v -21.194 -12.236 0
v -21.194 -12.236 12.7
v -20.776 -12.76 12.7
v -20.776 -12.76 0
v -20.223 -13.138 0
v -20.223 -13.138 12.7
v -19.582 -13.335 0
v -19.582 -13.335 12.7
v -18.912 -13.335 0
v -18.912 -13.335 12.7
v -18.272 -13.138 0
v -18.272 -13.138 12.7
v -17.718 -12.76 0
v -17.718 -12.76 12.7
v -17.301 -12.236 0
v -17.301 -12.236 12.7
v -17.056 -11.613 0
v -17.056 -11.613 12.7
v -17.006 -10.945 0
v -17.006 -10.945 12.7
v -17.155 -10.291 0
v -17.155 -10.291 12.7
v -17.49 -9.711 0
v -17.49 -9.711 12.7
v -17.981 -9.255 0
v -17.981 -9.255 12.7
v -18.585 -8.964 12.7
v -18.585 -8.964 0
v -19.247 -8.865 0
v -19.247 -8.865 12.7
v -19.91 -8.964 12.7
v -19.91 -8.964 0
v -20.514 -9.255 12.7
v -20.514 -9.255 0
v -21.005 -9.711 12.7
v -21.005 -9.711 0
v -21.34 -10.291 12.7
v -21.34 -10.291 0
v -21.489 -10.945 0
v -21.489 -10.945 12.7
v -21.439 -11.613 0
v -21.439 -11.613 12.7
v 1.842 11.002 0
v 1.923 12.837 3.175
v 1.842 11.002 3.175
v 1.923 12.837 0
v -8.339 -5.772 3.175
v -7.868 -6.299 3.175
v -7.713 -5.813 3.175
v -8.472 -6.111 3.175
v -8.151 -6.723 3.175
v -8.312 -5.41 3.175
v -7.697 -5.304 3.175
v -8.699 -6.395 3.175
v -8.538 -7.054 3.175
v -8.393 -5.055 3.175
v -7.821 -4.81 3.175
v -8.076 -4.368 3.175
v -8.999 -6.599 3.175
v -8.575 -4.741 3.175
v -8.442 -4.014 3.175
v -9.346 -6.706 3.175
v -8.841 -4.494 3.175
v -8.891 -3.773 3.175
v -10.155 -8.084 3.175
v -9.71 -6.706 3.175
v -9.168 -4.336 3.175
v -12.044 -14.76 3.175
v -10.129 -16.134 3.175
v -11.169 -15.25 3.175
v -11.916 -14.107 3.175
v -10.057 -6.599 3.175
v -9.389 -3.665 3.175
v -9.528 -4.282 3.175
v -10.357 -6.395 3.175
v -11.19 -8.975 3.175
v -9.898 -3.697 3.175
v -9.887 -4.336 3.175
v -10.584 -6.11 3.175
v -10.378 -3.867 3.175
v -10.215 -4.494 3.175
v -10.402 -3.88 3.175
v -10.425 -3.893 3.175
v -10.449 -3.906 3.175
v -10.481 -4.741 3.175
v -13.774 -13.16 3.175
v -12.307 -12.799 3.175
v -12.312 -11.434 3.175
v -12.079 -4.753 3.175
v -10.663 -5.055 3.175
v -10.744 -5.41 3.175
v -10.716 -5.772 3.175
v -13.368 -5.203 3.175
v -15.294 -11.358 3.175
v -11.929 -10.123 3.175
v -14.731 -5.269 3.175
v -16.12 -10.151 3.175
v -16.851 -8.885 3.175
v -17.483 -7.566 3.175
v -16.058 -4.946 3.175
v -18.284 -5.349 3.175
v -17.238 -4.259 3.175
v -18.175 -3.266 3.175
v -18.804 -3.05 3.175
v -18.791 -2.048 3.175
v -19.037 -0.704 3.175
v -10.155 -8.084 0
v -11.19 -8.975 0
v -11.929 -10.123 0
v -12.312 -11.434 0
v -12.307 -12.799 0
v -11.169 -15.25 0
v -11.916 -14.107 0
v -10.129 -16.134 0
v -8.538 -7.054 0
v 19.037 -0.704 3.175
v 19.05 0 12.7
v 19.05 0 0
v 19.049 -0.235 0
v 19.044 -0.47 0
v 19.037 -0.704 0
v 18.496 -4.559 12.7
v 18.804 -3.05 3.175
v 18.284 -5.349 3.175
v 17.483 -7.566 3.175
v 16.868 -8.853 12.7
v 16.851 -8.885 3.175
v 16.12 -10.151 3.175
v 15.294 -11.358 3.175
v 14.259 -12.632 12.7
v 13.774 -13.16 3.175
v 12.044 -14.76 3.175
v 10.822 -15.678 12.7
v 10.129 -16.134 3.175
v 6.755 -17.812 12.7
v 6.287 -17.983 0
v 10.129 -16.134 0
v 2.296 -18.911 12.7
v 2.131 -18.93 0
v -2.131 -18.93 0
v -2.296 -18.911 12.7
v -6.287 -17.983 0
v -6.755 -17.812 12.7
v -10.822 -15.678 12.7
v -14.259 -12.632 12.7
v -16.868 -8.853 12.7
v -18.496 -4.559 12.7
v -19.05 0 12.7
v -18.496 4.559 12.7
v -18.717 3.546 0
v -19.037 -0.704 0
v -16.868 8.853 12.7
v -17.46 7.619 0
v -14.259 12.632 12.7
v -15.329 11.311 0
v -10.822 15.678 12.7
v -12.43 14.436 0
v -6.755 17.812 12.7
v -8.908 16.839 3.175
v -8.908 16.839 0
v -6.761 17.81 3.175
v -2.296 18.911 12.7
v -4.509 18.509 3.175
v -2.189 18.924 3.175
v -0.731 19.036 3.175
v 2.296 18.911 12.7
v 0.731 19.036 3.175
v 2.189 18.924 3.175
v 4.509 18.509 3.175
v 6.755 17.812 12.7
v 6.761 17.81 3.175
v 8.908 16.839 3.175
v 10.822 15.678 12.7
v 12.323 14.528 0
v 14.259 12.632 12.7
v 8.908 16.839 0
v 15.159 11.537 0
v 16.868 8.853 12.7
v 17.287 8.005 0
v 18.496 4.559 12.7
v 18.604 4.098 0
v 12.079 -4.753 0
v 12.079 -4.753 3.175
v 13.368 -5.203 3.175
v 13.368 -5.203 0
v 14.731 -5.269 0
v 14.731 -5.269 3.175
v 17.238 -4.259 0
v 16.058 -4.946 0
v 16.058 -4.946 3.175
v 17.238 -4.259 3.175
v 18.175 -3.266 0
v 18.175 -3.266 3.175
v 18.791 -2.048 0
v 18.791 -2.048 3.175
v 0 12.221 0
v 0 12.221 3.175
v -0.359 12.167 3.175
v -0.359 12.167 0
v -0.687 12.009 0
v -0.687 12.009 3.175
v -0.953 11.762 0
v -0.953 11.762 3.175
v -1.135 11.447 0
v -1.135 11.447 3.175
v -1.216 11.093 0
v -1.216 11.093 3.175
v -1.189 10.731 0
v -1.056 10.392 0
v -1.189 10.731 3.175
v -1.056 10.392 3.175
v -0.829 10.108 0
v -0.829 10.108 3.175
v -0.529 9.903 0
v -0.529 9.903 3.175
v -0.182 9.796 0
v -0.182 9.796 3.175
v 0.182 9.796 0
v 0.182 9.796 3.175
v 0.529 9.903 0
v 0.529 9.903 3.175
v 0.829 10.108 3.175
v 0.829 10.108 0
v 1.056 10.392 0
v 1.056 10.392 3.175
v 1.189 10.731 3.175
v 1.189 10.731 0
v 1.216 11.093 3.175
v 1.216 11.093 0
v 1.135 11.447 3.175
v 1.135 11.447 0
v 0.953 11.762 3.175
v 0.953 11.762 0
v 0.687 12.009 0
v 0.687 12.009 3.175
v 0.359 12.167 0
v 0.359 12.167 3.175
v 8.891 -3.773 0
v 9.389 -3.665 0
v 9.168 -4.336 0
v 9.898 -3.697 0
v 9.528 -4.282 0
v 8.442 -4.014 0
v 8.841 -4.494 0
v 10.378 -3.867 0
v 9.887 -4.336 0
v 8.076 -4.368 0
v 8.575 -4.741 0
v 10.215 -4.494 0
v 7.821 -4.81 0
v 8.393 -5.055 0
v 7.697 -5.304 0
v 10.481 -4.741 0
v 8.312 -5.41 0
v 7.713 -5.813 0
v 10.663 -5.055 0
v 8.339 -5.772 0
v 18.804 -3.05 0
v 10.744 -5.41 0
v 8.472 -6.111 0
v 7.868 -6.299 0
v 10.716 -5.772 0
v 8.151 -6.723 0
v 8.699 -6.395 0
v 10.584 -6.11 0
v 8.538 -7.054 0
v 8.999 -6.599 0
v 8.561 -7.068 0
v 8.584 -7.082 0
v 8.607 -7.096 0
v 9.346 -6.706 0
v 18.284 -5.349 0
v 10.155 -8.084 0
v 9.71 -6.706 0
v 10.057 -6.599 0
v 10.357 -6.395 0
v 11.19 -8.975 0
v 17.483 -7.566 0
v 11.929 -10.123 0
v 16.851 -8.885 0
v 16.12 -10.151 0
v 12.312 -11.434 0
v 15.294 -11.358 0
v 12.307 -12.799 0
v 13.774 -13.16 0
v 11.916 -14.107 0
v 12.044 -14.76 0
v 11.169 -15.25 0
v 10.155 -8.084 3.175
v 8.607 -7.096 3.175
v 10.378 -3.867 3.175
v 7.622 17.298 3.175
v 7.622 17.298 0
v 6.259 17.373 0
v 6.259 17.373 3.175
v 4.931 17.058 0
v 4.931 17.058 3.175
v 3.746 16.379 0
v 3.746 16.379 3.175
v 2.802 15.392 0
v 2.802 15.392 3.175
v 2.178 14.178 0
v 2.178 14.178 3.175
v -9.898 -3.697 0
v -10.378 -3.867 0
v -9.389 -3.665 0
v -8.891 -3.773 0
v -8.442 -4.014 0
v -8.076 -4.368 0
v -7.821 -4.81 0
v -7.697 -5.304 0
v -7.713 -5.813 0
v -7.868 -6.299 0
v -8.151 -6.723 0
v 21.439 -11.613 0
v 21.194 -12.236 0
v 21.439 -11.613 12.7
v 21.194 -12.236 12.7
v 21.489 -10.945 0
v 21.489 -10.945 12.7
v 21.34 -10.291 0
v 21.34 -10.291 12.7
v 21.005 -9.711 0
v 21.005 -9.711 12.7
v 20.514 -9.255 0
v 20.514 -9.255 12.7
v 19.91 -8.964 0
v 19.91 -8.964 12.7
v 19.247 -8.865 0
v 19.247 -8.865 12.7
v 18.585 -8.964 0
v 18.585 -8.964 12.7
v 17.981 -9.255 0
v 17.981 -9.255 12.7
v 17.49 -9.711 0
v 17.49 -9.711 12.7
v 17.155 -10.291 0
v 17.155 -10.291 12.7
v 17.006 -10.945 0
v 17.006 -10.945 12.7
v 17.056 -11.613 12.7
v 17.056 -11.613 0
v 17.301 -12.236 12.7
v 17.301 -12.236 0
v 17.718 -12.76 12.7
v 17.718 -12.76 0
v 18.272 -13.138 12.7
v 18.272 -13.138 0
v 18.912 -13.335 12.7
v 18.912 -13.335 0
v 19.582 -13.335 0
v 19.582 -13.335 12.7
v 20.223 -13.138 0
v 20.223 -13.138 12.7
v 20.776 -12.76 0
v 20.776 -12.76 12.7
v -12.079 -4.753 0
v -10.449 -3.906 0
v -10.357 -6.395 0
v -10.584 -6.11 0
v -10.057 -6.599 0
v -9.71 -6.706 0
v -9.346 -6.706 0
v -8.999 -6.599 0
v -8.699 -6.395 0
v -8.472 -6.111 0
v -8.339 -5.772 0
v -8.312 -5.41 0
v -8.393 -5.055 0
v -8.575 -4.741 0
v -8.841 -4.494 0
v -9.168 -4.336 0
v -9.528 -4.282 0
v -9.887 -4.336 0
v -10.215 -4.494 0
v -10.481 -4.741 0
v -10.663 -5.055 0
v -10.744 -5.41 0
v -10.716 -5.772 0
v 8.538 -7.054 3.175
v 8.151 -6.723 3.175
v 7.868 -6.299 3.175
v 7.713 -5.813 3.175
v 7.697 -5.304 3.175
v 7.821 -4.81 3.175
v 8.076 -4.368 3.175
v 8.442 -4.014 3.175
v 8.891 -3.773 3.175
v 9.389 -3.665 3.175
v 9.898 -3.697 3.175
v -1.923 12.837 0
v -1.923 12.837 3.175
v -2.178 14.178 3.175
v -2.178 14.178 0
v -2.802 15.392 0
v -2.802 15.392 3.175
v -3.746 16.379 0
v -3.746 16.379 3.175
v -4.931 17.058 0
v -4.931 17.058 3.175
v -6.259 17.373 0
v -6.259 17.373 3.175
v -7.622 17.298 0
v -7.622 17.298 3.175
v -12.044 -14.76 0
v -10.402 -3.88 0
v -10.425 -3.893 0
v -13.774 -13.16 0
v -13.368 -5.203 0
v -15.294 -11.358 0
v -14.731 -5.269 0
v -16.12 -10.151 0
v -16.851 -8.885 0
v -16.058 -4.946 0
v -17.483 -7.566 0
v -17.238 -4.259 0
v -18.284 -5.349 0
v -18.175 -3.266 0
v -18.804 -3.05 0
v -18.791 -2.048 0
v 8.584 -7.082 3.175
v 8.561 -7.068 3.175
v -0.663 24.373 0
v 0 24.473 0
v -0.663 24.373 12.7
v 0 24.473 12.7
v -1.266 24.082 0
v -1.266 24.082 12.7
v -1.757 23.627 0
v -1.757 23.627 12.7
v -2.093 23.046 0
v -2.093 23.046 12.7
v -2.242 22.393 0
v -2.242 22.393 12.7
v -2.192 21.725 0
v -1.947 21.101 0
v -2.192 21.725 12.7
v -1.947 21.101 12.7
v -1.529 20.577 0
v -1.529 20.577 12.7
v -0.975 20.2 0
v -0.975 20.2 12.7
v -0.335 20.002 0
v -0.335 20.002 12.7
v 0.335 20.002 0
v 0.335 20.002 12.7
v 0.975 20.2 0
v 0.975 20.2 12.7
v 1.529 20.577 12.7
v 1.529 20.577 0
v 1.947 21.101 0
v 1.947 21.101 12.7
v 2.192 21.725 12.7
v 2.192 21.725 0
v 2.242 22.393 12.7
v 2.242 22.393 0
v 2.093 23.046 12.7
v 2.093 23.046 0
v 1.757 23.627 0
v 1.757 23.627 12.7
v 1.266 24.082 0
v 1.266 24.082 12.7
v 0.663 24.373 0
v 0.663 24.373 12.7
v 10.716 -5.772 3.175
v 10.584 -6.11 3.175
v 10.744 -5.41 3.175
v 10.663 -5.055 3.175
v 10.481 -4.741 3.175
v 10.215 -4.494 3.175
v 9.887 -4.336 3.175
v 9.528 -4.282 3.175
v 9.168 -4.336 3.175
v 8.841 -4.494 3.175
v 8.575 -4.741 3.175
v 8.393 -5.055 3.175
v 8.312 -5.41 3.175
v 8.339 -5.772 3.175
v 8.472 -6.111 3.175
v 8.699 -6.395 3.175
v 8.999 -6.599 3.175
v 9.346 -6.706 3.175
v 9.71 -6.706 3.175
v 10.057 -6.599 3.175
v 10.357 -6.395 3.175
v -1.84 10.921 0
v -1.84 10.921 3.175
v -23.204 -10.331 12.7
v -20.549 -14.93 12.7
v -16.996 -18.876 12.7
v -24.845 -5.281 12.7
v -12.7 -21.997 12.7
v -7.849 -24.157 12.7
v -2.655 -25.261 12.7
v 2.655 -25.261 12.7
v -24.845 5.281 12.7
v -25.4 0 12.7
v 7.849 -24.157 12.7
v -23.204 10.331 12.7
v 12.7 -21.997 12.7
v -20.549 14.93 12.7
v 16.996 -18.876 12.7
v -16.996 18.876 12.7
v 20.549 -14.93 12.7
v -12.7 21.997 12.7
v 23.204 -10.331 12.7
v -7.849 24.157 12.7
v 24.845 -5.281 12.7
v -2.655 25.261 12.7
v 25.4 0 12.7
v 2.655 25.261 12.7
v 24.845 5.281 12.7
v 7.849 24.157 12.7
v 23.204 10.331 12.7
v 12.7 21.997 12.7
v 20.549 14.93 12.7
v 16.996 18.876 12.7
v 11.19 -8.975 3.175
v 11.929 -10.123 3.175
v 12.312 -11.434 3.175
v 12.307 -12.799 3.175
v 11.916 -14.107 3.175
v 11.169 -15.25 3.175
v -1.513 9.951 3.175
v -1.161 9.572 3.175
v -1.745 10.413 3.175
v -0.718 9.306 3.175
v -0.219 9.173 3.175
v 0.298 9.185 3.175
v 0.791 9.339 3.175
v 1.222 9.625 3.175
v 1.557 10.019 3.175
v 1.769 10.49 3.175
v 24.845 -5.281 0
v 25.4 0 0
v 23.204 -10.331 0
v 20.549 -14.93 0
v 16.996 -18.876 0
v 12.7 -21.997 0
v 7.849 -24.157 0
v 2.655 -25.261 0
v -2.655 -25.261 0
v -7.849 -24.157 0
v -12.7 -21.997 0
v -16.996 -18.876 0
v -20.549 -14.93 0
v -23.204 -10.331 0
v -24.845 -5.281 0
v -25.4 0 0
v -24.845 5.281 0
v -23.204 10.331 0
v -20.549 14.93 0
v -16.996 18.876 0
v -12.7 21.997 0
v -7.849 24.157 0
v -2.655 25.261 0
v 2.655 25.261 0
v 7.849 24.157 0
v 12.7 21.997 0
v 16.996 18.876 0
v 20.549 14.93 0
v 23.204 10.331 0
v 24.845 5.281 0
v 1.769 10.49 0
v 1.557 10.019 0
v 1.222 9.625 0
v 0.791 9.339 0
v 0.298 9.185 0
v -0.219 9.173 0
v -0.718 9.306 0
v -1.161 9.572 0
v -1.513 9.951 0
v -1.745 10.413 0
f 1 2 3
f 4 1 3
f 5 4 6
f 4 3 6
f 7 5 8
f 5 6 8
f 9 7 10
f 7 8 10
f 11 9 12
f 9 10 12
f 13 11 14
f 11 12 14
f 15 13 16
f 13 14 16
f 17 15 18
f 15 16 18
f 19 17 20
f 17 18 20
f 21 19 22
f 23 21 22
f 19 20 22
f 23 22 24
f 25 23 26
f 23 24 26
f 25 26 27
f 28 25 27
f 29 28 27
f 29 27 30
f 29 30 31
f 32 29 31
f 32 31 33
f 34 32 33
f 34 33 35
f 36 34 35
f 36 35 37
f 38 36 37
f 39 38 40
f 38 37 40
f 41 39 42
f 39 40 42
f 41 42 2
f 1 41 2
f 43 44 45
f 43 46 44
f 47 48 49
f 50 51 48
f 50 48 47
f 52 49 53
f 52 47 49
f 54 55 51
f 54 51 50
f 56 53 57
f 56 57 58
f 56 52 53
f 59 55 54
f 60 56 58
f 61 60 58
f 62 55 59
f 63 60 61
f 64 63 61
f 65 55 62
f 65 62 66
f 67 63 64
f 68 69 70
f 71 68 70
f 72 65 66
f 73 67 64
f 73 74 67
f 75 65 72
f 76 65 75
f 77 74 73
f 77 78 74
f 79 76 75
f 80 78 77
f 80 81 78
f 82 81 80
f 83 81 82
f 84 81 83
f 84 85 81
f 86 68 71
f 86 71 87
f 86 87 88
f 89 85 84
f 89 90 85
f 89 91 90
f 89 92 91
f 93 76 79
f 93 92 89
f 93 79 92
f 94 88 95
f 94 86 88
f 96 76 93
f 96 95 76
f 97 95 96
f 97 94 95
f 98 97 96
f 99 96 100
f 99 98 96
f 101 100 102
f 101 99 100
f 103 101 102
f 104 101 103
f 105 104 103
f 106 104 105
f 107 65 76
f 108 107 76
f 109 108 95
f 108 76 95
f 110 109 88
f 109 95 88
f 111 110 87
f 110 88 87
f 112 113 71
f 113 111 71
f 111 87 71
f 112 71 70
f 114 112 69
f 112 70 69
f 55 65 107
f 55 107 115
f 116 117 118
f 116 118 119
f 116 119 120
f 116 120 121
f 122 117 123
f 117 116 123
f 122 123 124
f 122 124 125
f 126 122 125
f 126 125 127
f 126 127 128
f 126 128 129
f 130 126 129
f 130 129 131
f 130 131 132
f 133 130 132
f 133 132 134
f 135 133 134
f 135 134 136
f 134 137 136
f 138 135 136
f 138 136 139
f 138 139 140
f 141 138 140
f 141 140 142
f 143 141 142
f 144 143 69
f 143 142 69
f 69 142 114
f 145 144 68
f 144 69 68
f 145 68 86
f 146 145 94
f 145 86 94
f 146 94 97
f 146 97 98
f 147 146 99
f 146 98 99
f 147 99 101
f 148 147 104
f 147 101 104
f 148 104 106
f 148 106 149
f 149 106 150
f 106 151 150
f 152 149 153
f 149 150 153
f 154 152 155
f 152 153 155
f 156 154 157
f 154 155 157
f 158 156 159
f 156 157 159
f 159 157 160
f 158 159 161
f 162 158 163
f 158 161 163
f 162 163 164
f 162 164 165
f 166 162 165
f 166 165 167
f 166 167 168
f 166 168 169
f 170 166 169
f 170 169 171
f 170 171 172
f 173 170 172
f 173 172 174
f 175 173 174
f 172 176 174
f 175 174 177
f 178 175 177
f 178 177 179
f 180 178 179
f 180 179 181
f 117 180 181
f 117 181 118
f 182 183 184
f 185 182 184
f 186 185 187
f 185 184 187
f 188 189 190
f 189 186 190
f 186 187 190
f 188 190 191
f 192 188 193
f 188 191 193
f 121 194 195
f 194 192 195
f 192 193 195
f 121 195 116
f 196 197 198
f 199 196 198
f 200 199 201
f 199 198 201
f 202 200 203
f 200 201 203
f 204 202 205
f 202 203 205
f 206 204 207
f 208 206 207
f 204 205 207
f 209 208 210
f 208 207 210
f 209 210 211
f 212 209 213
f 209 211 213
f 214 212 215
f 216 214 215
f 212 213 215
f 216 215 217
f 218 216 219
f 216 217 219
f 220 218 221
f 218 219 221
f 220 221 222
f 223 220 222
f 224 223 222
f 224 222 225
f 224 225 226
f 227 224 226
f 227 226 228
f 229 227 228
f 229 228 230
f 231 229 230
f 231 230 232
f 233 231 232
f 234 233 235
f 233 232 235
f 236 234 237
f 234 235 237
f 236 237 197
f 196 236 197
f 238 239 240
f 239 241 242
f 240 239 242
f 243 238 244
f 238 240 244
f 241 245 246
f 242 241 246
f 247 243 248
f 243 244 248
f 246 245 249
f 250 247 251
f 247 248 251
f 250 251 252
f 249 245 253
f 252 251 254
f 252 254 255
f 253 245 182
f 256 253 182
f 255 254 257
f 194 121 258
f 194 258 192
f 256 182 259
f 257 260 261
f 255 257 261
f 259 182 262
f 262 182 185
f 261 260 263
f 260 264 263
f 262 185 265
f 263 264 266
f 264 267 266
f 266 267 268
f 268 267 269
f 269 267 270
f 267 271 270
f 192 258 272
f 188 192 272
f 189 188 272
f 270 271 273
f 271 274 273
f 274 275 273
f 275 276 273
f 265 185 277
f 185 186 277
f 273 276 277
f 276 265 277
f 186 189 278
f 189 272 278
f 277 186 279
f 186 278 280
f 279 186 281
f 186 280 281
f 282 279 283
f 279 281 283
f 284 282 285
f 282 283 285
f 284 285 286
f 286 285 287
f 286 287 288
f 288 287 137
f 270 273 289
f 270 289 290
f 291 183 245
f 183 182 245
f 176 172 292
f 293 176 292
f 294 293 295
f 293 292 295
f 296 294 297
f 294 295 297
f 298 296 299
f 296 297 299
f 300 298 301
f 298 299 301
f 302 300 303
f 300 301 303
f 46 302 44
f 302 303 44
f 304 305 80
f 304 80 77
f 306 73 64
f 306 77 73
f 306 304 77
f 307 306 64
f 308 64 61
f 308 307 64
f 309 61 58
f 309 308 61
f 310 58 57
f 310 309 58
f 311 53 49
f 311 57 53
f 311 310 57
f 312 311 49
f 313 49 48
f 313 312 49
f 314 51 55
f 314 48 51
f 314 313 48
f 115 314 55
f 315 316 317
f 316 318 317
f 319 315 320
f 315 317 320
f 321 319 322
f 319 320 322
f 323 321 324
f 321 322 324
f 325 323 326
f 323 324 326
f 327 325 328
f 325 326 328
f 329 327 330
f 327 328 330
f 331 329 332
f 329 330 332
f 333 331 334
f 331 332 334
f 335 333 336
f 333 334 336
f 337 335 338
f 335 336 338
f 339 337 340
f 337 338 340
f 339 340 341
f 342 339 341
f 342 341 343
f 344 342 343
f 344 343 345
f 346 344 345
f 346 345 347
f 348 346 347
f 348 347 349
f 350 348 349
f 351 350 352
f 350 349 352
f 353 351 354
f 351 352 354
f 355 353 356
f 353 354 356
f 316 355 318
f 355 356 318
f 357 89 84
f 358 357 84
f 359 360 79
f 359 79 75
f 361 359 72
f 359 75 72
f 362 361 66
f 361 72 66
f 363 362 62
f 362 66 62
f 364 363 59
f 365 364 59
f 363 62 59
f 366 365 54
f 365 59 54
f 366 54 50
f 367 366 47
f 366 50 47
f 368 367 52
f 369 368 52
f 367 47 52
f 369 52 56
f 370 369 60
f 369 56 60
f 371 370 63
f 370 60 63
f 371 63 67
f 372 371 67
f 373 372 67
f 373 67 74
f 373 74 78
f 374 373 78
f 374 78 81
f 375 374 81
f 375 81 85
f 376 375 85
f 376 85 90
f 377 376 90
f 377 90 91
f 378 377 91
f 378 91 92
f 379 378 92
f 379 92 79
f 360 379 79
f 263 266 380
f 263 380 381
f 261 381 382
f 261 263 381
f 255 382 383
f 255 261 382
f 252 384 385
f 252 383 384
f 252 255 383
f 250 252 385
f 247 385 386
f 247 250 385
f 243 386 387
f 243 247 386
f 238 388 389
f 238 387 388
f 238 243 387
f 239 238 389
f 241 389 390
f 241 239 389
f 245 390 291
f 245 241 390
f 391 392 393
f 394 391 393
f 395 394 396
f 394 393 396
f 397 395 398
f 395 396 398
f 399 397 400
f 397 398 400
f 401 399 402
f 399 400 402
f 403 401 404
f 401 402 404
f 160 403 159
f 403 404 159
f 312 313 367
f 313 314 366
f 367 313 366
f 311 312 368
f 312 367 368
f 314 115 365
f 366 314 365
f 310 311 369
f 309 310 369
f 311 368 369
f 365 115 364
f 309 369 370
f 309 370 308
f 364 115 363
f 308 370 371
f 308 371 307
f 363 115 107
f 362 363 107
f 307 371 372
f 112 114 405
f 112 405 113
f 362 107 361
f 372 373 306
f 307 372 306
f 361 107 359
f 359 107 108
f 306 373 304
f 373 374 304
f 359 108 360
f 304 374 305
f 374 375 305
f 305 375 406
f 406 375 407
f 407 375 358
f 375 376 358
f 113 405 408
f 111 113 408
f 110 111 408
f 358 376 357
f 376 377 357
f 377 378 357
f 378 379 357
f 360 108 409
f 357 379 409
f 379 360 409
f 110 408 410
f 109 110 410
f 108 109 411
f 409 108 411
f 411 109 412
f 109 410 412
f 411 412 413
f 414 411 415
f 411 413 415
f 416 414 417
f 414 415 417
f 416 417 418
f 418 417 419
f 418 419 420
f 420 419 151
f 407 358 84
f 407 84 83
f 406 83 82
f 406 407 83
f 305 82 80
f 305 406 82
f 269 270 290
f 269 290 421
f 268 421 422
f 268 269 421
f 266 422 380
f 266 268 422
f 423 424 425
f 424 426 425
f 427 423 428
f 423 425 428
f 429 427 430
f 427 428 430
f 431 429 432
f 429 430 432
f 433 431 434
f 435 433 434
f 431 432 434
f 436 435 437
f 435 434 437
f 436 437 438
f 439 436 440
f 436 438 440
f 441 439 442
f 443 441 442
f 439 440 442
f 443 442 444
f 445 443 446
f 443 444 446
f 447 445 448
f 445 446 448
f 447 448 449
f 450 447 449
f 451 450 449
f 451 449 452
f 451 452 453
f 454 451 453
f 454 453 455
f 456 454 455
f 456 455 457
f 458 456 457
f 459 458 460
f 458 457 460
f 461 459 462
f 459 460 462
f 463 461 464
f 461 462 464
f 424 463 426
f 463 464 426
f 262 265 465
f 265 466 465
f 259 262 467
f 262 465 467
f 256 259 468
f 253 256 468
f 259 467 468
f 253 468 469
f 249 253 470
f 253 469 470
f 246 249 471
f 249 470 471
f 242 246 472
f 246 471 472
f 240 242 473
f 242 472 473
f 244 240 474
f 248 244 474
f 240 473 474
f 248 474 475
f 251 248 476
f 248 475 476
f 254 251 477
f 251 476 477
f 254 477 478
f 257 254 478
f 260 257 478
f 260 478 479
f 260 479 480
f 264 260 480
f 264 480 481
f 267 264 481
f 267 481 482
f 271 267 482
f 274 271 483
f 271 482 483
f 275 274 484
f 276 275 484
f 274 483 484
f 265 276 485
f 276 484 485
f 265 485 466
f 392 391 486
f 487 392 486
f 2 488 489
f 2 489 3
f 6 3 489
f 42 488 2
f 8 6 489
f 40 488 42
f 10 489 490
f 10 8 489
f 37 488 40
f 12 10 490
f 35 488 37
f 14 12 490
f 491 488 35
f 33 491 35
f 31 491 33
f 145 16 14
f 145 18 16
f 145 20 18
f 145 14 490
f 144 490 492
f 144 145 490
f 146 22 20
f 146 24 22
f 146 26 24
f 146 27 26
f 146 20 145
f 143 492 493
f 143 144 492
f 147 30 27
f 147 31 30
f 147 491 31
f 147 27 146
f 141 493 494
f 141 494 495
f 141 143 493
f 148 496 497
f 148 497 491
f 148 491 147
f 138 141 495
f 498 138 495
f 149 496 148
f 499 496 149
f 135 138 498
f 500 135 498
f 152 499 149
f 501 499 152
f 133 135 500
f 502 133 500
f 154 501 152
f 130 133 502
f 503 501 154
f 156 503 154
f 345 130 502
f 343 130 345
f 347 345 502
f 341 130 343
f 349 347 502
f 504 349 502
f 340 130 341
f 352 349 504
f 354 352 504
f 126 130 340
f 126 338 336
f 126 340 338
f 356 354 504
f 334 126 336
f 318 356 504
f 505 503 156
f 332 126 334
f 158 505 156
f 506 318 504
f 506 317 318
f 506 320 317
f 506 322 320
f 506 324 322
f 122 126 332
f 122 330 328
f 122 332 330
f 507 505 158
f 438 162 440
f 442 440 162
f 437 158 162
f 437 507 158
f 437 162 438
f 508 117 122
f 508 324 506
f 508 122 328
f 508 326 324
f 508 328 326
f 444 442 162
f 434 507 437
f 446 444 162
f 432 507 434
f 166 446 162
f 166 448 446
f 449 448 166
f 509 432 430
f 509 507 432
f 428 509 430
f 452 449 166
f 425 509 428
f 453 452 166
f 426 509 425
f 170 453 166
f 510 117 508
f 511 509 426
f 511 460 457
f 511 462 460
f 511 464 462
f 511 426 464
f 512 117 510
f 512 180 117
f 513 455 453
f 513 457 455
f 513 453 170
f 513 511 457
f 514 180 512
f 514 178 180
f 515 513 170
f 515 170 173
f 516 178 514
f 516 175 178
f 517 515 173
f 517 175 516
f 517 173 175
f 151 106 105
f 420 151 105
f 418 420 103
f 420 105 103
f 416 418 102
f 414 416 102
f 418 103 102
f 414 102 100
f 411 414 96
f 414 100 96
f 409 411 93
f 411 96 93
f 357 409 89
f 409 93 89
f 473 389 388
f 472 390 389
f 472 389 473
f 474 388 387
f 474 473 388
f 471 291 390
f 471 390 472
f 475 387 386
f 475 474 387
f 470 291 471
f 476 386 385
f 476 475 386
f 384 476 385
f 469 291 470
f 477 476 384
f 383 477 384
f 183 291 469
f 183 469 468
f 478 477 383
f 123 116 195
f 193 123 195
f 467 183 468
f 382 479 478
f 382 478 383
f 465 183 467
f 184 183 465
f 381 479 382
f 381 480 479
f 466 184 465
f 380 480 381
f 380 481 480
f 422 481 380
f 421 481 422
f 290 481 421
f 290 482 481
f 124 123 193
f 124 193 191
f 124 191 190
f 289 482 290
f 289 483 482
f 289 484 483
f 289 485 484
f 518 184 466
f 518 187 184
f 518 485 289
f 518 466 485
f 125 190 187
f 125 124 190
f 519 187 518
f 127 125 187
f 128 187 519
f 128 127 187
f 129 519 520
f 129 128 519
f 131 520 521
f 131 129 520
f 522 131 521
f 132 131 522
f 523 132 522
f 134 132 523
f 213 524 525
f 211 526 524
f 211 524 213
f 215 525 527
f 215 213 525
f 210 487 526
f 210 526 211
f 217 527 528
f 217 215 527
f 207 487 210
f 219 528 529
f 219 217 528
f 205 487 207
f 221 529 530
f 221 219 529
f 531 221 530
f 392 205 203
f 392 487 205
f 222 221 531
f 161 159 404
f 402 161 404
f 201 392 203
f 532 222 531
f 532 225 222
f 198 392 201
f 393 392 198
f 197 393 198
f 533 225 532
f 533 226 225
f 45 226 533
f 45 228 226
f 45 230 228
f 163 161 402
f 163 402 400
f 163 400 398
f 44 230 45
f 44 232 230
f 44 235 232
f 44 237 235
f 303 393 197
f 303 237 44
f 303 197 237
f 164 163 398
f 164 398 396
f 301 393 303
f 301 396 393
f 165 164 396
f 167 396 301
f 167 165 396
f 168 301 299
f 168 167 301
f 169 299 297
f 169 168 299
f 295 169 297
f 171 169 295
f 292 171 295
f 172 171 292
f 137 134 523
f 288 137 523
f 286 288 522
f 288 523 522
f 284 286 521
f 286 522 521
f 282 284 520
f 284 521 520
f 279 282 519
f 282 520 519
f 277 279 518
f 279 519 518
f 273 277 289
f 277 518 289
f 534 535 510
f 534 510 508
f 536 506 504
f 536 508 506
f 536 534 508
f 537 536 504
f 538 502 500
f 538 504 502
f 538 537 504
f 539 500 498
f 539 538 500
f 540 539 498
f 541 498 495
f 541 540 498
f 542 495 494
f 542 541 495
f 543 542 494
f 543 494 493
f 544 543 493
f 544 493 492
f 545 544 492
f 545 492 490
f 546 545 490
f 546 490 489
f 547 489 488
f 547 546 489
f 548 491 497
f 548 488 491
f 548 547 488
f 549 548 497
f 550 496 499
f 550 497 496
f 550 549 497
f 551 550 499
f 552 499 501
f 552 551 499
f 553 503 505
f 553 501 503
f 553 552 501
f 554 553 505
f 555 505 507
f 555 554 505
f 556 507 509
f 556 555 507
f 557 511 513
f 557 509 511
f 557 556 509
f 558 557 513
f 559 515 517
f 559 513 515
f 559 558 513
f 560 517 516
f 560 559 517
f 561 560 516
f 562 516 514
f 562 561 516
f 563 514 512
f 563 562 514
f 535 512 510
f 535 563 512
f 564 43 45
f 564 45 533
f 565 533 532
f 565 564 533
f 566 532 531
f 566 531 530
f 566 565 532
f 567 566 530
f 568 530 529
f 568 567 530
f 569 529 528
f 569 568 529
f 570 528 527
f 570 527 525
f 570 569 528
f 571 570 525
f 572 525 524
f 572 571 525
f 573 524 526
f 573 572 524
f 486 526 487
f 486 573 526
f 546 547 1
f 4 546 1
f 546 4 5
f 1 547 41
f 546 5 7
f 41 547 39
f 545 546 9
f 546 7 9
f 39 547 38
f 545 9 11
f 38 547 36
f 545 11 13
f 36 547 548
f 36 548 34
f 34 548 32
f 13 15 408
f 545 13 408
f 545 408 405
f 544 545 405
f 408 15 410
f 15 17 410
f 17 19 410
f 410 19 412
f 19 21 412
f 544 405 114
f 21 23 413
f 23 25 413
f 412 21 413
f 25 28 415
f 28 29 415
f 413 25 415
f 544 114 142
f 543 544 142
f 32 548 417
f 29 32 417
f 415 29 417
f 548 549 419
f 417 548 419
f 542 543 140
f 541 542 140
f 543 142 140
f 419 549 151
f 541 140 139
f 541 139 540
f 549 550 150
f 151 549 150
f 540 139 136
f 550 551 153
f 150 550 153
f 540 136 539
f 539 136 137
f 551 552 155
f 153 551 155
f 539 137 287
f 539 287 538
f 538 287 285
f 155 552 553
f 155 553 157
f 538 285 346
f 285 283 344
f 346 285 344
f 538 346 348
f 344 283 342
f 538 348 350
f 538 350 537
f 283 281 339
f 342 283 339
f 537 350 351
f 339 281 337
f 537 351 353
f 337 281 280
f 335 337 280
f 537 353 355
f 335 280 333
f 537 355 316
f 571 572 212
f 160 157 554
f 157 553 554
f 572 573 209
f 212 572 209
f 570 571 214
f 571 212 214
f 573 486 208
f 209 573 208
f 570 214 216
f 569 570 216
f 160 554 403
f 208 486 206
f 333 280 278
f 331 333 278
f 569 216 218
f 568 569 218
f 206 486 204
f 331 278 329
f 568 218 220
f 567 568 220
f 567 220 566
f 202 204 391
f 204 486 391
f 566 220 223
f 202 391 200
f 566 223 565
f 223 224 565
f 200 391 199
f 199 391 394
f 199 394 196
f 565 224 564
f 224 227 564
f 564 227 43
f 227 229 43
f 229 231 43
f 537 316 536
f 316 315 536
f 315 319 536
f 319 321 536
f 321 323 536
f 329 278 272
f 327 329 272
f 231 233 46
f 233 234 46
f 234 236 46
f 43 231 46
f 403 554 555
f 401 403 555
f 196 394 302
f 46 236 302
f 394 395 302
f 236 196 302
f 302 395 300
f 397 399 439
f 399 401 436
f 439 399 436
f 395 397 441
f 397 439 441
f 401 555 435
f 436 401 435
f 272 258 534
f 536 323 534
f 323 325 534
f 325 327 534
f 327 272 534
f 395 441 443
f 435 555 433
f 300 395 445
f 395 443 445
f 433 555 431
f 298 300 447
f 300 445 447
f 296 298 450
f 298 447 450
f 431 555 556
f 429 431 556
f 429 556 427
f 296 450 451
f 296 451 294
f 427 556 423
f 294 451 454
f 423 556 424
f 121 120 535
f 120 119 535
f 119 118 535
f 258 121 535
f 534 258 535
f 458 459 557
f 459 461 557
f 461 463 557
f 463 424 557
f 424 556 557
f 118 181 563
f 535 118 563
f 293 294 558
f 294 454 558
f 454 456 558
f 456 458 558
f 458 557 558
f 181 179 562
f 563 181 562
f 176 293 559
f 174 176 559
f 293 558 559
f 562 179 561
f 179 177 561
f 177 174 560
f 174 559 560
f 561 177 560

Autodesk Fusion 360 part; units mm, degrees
sketch "Sketch1" plane through (0, 0, 0) normal (0, 0, 1) x (1, 0, 0)
  circle A0 centre (0, 0) radius 19.05
  circle A1 centre (0, 0) radius 25.4
  circle A2 centre (0, 0) radius 22.225 construction
  line L0 (0, 0) -> (0, 11.0018) construction
  circle A3 centre (0, 0) radius 7.9375 construction
  circle A4 centre (0, 11.0018) radius 1.8415
  line L1 (-16.9425, 18.9238) -> (16.9425, 18.9238) construction
  line L2 (2.1891, 18.9238) -> (1.8397, 10.9214)
  line L3 (-2.1891, 18.9238) -> (-1.8397, 10.9214)
  circle A5 centre (0, 11.0018) radius 3.0643 construction
  point P0 (0, 18.9238)
  point P1 (0, 22.225)
  dimension "d1" = 38.1
  dimension "d2" = 50.8
  dimension "d3" = 44.45
  dimension "d4" = 11.0018
  dimension "d5" = 15.875
  dimension "otherdiam" = 3.683
  dimension "d28" = 2.5
extrude "Extrude1" add sketch "Sketch1" along normal blind 12.7
extrude "Extrude2" add sketch "Sketch1" along normal blind 3.175 contours A0 A4 L2 L3 | A4 L2 picked at (-0.0134, 16.9716)
hole "Hole1" at (0, 22.225, 0) direction (0, 0, 1) diameter 4.4958 end up to surface (12.7 mm away)
hole "Hole2" at (0, 11.0018, 0) direction (0, 0, 1) diameter 2.4384 end up to surface (3.175 mm away)
pattern_circular "C-Pattern1" count 3 over 360 about axis through (0, 0, 0) along (0, 0, 1) of "Extrude2"
pattern_circular "C-Pattern2" count 3 over 360 about axis through (0, 0, 0) along (0, 0, 1) of "Hole1"
pattern_circular "C-Pattern3" count 3 over 360 about axis through (0, 0, 0) along (0, 0, 1) of "Hole2"
fillet "Fillet1" radius 4.7625 6 edges at (-17.4831, -7.5661, 1.5875) (-15.2939, -11.3577, 1.5875) (2.1891, 18.9238, 1.5875) (-2.1891, 18.9238, 1.5875) (15.2939, -11.3577, 1.5875) (17.4831, -7.5661, 1.5875)
equation "d28 = angle"
equation "angle = 2.5 deg"
